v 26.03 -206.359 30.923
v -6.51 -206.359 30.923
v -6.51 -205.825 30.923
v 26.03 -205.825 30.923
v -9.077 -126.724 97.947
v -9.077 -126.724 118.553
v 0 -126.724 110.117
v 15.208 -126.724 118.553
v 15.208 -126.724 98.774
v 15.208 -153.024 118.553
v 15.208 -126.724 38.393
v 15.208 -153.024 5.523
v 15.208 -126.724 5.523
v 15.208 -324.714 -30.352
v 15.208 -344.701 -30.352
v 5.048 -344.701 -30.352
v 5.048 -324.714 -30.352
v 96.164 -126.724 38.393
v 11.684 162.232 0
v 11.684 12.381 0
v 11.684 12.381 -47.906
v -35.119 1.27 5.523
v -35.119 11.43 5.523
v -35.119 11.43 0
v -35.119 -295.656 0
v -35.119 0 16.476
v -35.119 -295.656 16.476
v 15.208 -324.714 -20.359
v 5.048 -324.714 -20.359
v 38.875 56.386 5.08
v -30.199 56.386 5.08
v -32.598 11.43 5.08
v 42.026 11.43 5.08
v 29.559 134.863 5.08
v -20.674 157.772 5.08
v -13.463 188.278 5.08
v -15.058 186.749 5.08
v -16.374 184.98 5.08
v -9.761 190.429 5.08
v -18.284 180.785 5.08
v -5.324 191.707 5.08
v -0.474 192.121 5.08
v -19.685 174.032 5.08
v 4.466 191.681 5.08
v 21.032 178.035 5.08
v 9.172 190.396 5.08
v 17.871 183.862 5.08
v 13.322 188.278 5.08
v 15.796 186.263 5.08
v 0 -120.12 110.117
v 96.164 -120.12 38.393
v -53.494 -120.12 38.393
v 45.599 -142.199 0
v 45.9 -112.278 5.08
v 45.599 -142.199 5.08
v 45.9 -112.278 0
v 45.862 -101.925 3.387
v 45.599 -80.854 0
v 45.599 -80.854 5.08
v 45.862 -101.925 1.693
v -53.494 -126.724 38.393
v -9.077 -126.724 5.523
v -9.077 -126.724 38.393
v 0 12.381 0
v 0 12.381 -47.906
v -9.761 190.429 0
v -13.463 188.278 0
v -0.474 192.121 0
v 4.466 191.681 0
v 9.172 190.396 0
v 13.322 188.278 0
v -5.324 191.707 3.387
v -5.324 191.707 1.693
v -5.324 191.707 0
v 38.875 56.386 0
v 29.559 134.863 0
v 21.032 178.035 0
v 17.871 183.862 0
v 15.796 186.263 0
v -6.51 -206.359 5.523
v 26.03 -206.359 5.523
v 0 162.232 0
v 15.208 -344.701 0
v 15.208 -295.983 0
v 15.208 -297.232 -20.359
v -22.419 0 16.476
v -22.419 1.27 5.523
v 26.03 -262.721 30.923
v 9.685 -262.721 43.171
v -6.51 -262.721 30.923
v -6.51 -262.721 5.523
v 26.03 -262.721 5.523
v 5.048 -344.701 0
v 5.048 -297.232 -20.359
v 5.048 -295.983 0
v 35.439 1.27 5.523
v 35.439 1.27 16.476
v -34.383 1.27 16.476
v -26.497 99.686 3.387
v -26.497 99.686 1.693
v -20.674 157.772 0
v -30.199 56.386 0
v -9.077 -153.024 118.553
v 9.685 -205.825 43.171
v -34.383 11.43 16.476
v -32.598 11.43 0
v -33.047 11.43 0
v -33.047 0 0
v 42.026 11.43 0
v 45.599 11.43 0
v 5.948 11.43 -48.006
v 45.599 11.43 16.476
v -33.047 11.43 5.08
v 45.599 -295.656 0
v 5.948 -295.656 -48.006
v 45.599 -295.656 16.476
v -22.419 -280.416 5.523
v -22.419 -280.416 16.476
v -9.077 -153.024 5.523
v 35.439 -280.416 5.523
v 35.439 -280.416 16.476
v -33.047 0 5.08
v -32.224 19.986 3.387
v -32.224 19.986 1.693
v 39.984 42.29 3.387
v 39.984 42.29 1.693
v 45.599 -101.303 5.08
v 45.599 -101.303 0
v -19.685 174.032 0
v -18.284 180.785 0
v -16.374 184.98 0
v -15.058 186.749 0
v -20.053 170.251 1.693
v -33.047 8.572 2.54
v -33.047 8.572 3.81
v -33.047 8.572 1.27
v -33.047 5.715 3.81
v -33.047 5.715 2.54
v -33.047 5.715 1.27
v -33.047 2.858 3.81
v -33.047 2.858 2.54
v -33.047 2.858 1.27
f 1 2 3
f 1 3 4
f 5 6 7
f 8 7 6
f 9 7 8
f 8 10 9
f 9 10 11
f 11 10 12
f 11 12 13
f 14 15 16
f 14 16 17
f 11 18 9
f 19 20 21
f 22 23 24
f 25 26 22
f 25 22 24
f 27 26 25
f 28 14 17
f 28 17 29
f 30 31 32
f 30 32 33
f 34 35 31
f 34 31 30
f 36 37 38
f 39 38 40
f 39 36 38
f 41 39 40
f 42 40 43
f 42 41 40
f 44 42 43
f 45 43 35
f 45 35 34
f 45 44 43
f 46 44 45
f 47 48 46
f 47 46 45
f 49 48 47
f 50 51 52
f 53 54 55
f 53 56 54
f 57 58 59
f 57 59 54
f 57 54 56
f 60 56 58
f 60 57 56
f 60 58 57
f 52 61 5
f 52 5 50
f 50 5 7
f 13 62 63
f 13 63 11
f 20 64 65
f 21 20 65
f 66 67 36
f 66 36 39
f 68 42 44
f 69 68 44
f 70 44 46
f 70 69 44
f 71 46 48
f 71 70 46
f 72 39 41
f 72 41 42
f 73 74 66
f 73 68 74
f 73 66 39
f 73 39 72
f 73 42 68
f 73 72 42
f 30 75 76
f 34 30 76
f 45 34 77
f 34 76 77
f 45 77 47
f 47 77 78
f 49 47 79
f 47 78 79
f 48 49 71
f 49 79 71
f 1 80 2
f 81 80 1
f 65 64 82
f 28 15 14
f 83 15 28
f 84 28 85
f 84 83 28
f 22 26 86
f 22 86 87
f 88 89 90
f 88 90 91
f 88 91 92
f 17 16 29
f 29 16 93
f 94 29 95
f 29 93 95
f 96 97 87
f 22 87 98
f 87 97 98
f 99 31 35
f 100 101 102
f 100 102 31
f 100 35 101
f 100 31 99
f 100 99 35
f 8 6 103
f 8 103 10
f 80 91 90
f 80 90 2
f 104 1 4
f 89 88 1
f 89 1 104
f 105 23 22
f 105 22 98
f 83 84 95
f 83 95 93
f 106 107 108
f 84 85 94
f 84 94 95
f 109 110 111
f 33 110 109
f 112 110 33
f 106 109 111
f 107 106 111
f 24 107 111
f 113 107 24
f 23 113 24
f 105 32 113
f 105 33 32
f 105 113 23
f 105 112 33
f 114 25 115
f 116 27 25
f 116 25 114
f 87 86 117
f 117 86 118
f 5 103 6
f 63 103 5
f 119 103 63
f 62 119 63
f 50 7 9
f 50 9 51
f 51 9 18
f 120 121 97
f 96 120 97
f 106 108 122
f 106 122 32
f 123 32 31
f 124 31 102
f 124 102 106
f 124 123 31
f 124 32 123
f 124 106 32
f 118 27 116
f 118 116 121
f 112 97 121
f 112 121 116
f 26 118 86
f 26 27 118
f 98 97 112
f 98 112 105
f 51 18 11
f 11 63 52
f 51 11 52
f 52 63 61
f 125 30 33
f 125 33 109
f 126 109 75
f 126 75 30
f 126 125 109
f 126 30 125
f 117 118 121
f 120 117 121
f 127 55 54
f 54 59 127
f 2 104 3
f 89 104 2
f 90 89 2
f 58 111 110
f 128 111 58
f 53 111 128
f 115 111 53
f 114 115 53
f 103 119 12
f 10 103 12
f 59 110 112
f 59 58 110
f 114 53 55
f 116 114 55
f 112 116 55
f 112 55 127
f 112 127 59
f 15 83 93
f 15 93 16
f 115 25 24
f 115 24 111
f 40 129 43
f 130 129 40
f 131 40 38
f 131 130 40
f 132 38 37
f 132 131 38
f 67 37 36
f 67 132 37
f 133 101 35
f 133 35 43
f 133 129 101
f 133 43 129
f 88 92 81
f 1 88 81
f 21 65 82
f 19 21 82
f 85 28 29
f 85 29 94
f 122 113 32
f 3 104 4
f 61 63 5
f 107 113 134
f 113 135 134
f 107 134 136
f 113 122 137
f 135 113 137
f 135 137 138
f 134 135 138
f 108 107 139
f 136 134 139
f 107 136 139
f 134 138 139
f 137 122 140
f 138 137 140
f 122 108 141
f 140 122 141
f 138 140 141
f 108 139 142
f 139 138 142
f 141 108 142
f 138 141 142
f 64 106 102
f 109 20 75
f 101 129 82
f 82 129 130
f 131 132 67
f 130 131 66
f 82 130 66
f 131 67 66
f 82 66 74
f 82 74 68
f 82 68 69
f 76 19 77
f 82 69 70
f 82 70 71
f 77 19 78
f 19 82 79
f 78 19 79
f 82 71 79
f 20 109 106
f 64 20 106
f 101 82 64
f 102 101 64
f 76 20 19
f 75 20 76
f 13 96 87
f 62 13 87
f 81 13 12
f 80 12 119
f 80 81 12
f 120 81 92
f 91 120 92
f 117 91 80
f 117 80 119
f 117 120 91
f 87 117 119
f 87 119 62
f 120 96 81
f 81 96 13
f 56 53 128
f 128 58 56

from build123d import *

# Parameters (mm, degrees)
F0_W      = 26.7850067466
F0_H      = 30.5056869984
F0_W_2    = 12.1168894693
F0_H_2    = 33.0980867147
F0_W_3    = 21.1634831503
F0_H_3    = 19.6867287159
F2_DEPTH  = 5.08
F3_DEPTH  = 295.656
F4_DEPTH  = 11.43
F5_W      = 24.2851879448
F5_H      = 26.3005495071
F6_DEPTH  = 113.03
F8_DEPTH  = 10.16
F9_W      = 80.7180516422
F9_H      = 10.9530324116
F10_DEPTH = 15.24
F11_W     = 291.846
F11_H     = 16.4758469909
F12_DEPTH = 10.16
F14_DEPTH = 10.16
F16_DEPTH = 12.7
F18_DEPTH = 6.604
F19_W     = 32.5404251926
F19_H     = 56.3616752625
F20_DEPTH = 25.4
F22_DEPTH = 56.896
F24_DEPTH = 11.684


with BuildPart() as f2:
    # F0 (on Top) → F2 (new body)
    with BuildSketch(Plane.XY):
        Polygon((38.8748385012, -220.5782085657), (38.8748385012, 56.3859827816), (25.7489401847, 56.3859827816), (-20.6735972315, 56.3859827816), (-30.1988460124, 56.3859827816), (-30.1988460124, -220.5782085657), (-20.6735972315, -220.5782085657), (-8.5567077622, -220.5782085657), (24.1141803563, -220.5782085657), align=None)
        with BuildLine():
            add(Edge.make_bspline(
                [(38.8748385012, 56.3859827816), (45.7754945346, -26.4133011189), (50.4230902449, -170.0508183116), (38.8748385012, -220.5782085657)],
                knots=[0.6665239349, 0.6665239349, 0.6665239349, 0.6665239349, 0.8397497546, 0.8397497546, 0.8397497546, 0.8397497546], degree=3))
            Line((38.8748385012, 56.3859827816), (38.8748385012, -220.5782085657))
        make_face()
        with BuildLine():
            Line((25.7489401847, 56.3859827816), (38.8748385012, 56.3859827816))
            add(Edge.make_bspline(
                [(25.7489401847, 157.7720195055), (29.6582093124, 134.5389617367), (34.6823452746, 106.6906835587), (38.8748385012, 56.3859827816)],
                knots=[0.5612805969, 0.5612805969, 0.5612805969, 0.5612805969, 0.6665239349, 0.6665239349, 0.6665239349, 0.6665239349], degree=3))
            Line((25.7489401847, 157.7720195055), (25.7489401847, 56.3859827816))
        make_face()
        Polygon((-20.6735972315, 56.3859827816), (25.7489401847, 56.3859827816), (25.7489401847, 157.7720195055), (13.3218923584, 157.7720195055), (-13.4631143883, 157.7720195055), (-20.6735972315, 157.7720195055), align=None)
        with BuildLine():
            add(Edge.make_bspline(
                [(38.8748385012, -220.5782085657), (34.6974928863, -238.8554661799), (28.4009469605, -244.9494150468), (24.1141803563, -253.6762952805)],
                knots=[0.8397497546, 0.8397497546, 0.8397497546, 0.8397497546, 0.902410678, 0.902410678, 0.902410678, 0.902410678], degree=3))
            Line((38.8748385012, -220.5782085657), (24.1141803563, -220.5782085657))
            Line((24.1141803563, -220.5782085657), (24.1141803563, -253.6762952805))
        make_face()
        with BuildLine():
            Line((13.3218923584, 157.7720195055), (25.7489401847, 157.7720195055))
            add(Edge.make_bspline(
                [(13.3218923584, 188.2777065039), (21.6701078921, 182.6606005161), (23.52991592, 170.9598347334), (25.7489401847, 157.7720195055)],
                knots=[0.501541164, 0.501541164, 0.501541164, 0.501541164, 0.5612805969, 0.5612805969, 0.5612805969, 0.5612805969], degree=3))
            Line((13.3218923584, 188.2777065039), (13.3218923584, 157.7720195055))
        make_face()
        with BuildLine():
            Line((-30.1988460124, 56.3859827816), (-20.6735972315, 56.3859827816))
            Line((-20.6735972315, 56.3859827816), (-20.6735972315, 157.7720195055))
            add(Edge.make_bspline(
                [(-30.1988460124, 56.3859827816), (-26.811728067, 106.461285668), (-21.9018730118, 134.1858202728), (-20.6735972315, 157.7720195055)],
                knots=[0.284357255, 0.284357255, 0.284357255, 0.284357255, 0.3893946698, 0.3893946698, 0.3893946698, 0.3893946698], degree=3))
        make_face()
        Polygon((24.1141803563, -253.6762952805), (24.1141803563, -220.5782085657), (-8.5567077622, -220.5782085657), (-8.5567077622, -253.6762952805), (12.6067753881, -253.6762952805), align=None)
        with BuildLine():
            add(Edge.make_bspline(
                [(24.1141803563, -253.6762952805), (20.7137638143, -260.5987687077), (18.5779465707, -269.1779430091), (12.6067753881, -273.3630239964)],
                knots=[0.902410678, 0.902410678, 0.902410678, 0.902410678, 0.9521155629, 0.9521155629, 0.9521155629, 0.9521155629], degree=3))
            Line((24.1141803563, -253.6762952805), (12.6067753881, -253.6762952805))
            Line((12.6067753881, -253.6762952805), (12.6067753881, -273.3630239964))
        make_face()
        with Locations((-0.070611015, 173.0248630047)):
            Rectangle(F0_W, F0_H)
        with BuildLine():
            Line((-13.4631143883, 188.2777065039), (13.3218923584, 188.2777065039))
            add(Edge.make_bspline(
                [(-13.4631143883, 188.2777065039), (-7.010150179, 193.4612102579), (5.7938985877, 193.3429253778), (13.3218923584, 188.2777065039)],
                knots=[0.4476711989, 0.4476711989, 0.4476711989, 0.4476711989, 0.501541164, 0.501541164, 0.501541164, 0.501541164], degree=3))
        make_face()
        with BuildLine():
            Line((-30.1988460124, -220.5782085657), (-30.1988460124, 56.3859827816))
            add(Edge.make_bspline(
                [(-30.1988460124, -220.5782085657), (-37.22925168, -169.5702511067), (-35.7848201471, -26.1973081538), (-30.1988460124, 56.3859827816)],
                knots=[0.1111314354, 0.1111314354, 0.1111314354, 0.1111314354, 0.284357255, 0.284357255, 0.284357255, 0.284357255], degree=3))
        make_face()
        with BuildLine():
            add(Edge.make_bspline(
                [(-20.6735972315, 157.7720195055), (-19.9921291147, 170.8580406025), (-20.4439311833, 182.6701920516), (-13.4631143883, 188.2777065039)],
                knots=[0.3893946698, 0.3893946698, 0.3893946698, 0.3893946698, 0.4476711989, 0.4476711989, 0.4476711989, 0.4476711989], degree=3))
            Line((-20.6735972315, 157.7720195055), (-13.4631143883, 157.7720195055))
            Line((-13.4631143883, 157.7720195055), (-13.4631143883, 188.2777065039))
        make_face()
        with Locations((-14.6151524968, -237.1272519231)):
            Rectangle(F0_W_2, F0_H_2)
        with Locations((2.025033813, -263.5196596384)):
            Rectangle(F0_W_3, F0_H_3)
        with BuildLine():
            add(Edge.make_bspline(
                [(12.6067753881, -273.3630239964), (6.8542991085, -277.3948258609), (-2.4577352033, -277.3485086263), (-8.5567077622, -273.3630239964)],
                knots=[0.9521155629, 0.9521155629, 0.9521155629, 0.9521155629, 1, 1, 1, 1], degree=3))
            Line((12.6067753881, -273.3630239964), (-8.5567077622, -273.3630239964))
        make_face()
        with BuildLine():
            Line((-20.6735972315, -220.5782085657), (-30.1988460124, -220.5782085657))
            add(Edge.make_bspline(
                [(-20.6735972315, -253.6762952805), (-24.1865964905, -245.0669765103), (-27.719658883, -238.5655449448), (-30.1988460124, -220.5782085657)],
                knots=[0.050045455, 0.050045455, 0.050045455, 0.050045455, 0.1111314354, 0.1111314354, 0.1111314354, 0.1111314354], degree=3))
            Line((-20.6735972315, -253.6762952805), (-20.6735972315, -220.5782085657))
        make_face()
        with BuildLine():
            Line((-8.5567077622, -273.3630239964), (-8.5567077622, -253.6762952805))
            Line((-8.5567077622, -253.6762952805), (-20.6735972315, -253.6762952805))
            add(Edge.make_bspline(
                [(-8.5567077622, -273.3630239964), (-14.9309260863, -269.1976750112), (-17.7955285606, -260.7295875824), (-20.6735972315, -253.6762952805)],
                knots=[0, 0, 0, 0, 0.050045455, 0.050045455, 0.050045455, 0.050045455], degree=3))
        make_face()
    extrude(amount=F2_DEPTH)

    # F1 (on Front) → F3 (join)
    with BuildSketch(Plane.XZ):
        Polygon((45.5986186862, 5.5228145793), (-35.119432956, 5.5228145793), (-35.119432956, 0), (5.9476448223, -48.0060018599), (45.5986186862, 0), align=None)
    extrude(amount=F3_DEPTH)

    # F4 (add): a face of the model
    f4_faces = [f2.faces().sort_by_distance(p)[0] for p in [
        (5.5510275585, 0, -15.3852185694),
    ]]
    extrude(f4_faces, amount=F4_DEPTH)

    # F5 (on face) → F6 (join)
    with BuildSketch(Plane.XY.offset(5.5228145793)):
        with Locations((3.0658328906, -139.8739814758)):
            Rectangle(F5_W, F5_H)
    extrude(amount=F6_DEPTH)

    # F9 (on face) → F10 (join)
    with BuildSketch(Plane.XZ.offset(295.656)):
        with Locations((5.2395928651, 10.9993307851)):
            Rectangle(F9_W, F9_H)
    extrude(amount=-F10_DEPTH)

    # F11 (on face) → F12 (join)
    with BuildSketch(Plane.YZ.offset(45.5986186862)):
        with Locations((-134.493, 8.2379234955)):
            Rectangle(F11_W, F11_H)
    extrude(amount=-F12_DEPTH)

    # F13 (on face) → F14 (join)
    with BuildSketch(Plane(origin=(0, 11.43, 0), x_dir=(-1, 0, 0), z_dir=(0, 1, 0))):
        Polygon((34.3833528459, 16.4758469909), (-35.4386186862, 16.4758469909), (-35.4386186862, 5.5228145793), (35.119432956, 5.5228145793), align=None)
    extrude(amount=-F14_DEPTH)

    # F15 (on face) → F16 (join)
    with BuildSketch(Plane(origin=(-35.119432956, 0, 0), x_dir=(0, -1, 0), z_dir=(-1, 0, 0))):
        Polygon((0, 16.4758469909), (-1.27, 5.5228145793), (280.416, 5.5228145793), (280.416, 16.4758469909), align=None)
    extrude(amount=-F16_DEPTH)

    # F17 (on face) → F18 (join)
    with BuildSketch(Plane(origin=(0, -126.7237067223, 0), x_dir=(-1, 0, 0), z_dir=(0, 1, 0))):
        Polygon((-96.1642712355, 38.3932814002), (-15.208426863, 38.3932814002), (53.4943619216, 38.3932814002), (0, 110.1166829467), align=None)
    extrude(amount=F18_DEPTH)

    # F19 (on face) → F20 (join)
    with BuildSketch(Plane.XY.offset(5.5228145793)):
        with Locations((9.7597131971, -234.5397472382)):
            Rectangle(F19_W, F19_H)
    extrude(amount=F20_DEPTH)

    # F21 (on face) → F22 (join)
    with BuildSketch(Plane.XZ.offset(262.7205848694)):
        Polygon((9.6849109977, 43.171018362), (-6.5104993992, 30.9228145793), (26.0299257934, 30.9228145793), align=None)
    extrude(amount=-F22_DEPTH)

    # F23 (on Right) → F24 (join)
    with BuildSketch(Plane.YZ):
        Polygon((162.2316092253, 0), (12.3808393255, 0), (12.3808393255, -47.9061752558), align=None)
    extrude(amount=F24_DEPTH)


with BuildPart() as f8:
    # F7 (on face) → F8 (new body)
    with BuildSketch(Plane.YZ.offset(15.208426863)):
        Polygon((-297.2323298454, -20.3589573503), (-295.9831655025, 0), (-344.7013199329, 0), (-344.7013199329, -30.3524285555), (-324.7143924236, -30.3524285555), (-324.7143924236, -20.3589573503), align=None)
    extrude(amount=-F8_DEPTH)


solid = Compound([f2.part, f8.part])
